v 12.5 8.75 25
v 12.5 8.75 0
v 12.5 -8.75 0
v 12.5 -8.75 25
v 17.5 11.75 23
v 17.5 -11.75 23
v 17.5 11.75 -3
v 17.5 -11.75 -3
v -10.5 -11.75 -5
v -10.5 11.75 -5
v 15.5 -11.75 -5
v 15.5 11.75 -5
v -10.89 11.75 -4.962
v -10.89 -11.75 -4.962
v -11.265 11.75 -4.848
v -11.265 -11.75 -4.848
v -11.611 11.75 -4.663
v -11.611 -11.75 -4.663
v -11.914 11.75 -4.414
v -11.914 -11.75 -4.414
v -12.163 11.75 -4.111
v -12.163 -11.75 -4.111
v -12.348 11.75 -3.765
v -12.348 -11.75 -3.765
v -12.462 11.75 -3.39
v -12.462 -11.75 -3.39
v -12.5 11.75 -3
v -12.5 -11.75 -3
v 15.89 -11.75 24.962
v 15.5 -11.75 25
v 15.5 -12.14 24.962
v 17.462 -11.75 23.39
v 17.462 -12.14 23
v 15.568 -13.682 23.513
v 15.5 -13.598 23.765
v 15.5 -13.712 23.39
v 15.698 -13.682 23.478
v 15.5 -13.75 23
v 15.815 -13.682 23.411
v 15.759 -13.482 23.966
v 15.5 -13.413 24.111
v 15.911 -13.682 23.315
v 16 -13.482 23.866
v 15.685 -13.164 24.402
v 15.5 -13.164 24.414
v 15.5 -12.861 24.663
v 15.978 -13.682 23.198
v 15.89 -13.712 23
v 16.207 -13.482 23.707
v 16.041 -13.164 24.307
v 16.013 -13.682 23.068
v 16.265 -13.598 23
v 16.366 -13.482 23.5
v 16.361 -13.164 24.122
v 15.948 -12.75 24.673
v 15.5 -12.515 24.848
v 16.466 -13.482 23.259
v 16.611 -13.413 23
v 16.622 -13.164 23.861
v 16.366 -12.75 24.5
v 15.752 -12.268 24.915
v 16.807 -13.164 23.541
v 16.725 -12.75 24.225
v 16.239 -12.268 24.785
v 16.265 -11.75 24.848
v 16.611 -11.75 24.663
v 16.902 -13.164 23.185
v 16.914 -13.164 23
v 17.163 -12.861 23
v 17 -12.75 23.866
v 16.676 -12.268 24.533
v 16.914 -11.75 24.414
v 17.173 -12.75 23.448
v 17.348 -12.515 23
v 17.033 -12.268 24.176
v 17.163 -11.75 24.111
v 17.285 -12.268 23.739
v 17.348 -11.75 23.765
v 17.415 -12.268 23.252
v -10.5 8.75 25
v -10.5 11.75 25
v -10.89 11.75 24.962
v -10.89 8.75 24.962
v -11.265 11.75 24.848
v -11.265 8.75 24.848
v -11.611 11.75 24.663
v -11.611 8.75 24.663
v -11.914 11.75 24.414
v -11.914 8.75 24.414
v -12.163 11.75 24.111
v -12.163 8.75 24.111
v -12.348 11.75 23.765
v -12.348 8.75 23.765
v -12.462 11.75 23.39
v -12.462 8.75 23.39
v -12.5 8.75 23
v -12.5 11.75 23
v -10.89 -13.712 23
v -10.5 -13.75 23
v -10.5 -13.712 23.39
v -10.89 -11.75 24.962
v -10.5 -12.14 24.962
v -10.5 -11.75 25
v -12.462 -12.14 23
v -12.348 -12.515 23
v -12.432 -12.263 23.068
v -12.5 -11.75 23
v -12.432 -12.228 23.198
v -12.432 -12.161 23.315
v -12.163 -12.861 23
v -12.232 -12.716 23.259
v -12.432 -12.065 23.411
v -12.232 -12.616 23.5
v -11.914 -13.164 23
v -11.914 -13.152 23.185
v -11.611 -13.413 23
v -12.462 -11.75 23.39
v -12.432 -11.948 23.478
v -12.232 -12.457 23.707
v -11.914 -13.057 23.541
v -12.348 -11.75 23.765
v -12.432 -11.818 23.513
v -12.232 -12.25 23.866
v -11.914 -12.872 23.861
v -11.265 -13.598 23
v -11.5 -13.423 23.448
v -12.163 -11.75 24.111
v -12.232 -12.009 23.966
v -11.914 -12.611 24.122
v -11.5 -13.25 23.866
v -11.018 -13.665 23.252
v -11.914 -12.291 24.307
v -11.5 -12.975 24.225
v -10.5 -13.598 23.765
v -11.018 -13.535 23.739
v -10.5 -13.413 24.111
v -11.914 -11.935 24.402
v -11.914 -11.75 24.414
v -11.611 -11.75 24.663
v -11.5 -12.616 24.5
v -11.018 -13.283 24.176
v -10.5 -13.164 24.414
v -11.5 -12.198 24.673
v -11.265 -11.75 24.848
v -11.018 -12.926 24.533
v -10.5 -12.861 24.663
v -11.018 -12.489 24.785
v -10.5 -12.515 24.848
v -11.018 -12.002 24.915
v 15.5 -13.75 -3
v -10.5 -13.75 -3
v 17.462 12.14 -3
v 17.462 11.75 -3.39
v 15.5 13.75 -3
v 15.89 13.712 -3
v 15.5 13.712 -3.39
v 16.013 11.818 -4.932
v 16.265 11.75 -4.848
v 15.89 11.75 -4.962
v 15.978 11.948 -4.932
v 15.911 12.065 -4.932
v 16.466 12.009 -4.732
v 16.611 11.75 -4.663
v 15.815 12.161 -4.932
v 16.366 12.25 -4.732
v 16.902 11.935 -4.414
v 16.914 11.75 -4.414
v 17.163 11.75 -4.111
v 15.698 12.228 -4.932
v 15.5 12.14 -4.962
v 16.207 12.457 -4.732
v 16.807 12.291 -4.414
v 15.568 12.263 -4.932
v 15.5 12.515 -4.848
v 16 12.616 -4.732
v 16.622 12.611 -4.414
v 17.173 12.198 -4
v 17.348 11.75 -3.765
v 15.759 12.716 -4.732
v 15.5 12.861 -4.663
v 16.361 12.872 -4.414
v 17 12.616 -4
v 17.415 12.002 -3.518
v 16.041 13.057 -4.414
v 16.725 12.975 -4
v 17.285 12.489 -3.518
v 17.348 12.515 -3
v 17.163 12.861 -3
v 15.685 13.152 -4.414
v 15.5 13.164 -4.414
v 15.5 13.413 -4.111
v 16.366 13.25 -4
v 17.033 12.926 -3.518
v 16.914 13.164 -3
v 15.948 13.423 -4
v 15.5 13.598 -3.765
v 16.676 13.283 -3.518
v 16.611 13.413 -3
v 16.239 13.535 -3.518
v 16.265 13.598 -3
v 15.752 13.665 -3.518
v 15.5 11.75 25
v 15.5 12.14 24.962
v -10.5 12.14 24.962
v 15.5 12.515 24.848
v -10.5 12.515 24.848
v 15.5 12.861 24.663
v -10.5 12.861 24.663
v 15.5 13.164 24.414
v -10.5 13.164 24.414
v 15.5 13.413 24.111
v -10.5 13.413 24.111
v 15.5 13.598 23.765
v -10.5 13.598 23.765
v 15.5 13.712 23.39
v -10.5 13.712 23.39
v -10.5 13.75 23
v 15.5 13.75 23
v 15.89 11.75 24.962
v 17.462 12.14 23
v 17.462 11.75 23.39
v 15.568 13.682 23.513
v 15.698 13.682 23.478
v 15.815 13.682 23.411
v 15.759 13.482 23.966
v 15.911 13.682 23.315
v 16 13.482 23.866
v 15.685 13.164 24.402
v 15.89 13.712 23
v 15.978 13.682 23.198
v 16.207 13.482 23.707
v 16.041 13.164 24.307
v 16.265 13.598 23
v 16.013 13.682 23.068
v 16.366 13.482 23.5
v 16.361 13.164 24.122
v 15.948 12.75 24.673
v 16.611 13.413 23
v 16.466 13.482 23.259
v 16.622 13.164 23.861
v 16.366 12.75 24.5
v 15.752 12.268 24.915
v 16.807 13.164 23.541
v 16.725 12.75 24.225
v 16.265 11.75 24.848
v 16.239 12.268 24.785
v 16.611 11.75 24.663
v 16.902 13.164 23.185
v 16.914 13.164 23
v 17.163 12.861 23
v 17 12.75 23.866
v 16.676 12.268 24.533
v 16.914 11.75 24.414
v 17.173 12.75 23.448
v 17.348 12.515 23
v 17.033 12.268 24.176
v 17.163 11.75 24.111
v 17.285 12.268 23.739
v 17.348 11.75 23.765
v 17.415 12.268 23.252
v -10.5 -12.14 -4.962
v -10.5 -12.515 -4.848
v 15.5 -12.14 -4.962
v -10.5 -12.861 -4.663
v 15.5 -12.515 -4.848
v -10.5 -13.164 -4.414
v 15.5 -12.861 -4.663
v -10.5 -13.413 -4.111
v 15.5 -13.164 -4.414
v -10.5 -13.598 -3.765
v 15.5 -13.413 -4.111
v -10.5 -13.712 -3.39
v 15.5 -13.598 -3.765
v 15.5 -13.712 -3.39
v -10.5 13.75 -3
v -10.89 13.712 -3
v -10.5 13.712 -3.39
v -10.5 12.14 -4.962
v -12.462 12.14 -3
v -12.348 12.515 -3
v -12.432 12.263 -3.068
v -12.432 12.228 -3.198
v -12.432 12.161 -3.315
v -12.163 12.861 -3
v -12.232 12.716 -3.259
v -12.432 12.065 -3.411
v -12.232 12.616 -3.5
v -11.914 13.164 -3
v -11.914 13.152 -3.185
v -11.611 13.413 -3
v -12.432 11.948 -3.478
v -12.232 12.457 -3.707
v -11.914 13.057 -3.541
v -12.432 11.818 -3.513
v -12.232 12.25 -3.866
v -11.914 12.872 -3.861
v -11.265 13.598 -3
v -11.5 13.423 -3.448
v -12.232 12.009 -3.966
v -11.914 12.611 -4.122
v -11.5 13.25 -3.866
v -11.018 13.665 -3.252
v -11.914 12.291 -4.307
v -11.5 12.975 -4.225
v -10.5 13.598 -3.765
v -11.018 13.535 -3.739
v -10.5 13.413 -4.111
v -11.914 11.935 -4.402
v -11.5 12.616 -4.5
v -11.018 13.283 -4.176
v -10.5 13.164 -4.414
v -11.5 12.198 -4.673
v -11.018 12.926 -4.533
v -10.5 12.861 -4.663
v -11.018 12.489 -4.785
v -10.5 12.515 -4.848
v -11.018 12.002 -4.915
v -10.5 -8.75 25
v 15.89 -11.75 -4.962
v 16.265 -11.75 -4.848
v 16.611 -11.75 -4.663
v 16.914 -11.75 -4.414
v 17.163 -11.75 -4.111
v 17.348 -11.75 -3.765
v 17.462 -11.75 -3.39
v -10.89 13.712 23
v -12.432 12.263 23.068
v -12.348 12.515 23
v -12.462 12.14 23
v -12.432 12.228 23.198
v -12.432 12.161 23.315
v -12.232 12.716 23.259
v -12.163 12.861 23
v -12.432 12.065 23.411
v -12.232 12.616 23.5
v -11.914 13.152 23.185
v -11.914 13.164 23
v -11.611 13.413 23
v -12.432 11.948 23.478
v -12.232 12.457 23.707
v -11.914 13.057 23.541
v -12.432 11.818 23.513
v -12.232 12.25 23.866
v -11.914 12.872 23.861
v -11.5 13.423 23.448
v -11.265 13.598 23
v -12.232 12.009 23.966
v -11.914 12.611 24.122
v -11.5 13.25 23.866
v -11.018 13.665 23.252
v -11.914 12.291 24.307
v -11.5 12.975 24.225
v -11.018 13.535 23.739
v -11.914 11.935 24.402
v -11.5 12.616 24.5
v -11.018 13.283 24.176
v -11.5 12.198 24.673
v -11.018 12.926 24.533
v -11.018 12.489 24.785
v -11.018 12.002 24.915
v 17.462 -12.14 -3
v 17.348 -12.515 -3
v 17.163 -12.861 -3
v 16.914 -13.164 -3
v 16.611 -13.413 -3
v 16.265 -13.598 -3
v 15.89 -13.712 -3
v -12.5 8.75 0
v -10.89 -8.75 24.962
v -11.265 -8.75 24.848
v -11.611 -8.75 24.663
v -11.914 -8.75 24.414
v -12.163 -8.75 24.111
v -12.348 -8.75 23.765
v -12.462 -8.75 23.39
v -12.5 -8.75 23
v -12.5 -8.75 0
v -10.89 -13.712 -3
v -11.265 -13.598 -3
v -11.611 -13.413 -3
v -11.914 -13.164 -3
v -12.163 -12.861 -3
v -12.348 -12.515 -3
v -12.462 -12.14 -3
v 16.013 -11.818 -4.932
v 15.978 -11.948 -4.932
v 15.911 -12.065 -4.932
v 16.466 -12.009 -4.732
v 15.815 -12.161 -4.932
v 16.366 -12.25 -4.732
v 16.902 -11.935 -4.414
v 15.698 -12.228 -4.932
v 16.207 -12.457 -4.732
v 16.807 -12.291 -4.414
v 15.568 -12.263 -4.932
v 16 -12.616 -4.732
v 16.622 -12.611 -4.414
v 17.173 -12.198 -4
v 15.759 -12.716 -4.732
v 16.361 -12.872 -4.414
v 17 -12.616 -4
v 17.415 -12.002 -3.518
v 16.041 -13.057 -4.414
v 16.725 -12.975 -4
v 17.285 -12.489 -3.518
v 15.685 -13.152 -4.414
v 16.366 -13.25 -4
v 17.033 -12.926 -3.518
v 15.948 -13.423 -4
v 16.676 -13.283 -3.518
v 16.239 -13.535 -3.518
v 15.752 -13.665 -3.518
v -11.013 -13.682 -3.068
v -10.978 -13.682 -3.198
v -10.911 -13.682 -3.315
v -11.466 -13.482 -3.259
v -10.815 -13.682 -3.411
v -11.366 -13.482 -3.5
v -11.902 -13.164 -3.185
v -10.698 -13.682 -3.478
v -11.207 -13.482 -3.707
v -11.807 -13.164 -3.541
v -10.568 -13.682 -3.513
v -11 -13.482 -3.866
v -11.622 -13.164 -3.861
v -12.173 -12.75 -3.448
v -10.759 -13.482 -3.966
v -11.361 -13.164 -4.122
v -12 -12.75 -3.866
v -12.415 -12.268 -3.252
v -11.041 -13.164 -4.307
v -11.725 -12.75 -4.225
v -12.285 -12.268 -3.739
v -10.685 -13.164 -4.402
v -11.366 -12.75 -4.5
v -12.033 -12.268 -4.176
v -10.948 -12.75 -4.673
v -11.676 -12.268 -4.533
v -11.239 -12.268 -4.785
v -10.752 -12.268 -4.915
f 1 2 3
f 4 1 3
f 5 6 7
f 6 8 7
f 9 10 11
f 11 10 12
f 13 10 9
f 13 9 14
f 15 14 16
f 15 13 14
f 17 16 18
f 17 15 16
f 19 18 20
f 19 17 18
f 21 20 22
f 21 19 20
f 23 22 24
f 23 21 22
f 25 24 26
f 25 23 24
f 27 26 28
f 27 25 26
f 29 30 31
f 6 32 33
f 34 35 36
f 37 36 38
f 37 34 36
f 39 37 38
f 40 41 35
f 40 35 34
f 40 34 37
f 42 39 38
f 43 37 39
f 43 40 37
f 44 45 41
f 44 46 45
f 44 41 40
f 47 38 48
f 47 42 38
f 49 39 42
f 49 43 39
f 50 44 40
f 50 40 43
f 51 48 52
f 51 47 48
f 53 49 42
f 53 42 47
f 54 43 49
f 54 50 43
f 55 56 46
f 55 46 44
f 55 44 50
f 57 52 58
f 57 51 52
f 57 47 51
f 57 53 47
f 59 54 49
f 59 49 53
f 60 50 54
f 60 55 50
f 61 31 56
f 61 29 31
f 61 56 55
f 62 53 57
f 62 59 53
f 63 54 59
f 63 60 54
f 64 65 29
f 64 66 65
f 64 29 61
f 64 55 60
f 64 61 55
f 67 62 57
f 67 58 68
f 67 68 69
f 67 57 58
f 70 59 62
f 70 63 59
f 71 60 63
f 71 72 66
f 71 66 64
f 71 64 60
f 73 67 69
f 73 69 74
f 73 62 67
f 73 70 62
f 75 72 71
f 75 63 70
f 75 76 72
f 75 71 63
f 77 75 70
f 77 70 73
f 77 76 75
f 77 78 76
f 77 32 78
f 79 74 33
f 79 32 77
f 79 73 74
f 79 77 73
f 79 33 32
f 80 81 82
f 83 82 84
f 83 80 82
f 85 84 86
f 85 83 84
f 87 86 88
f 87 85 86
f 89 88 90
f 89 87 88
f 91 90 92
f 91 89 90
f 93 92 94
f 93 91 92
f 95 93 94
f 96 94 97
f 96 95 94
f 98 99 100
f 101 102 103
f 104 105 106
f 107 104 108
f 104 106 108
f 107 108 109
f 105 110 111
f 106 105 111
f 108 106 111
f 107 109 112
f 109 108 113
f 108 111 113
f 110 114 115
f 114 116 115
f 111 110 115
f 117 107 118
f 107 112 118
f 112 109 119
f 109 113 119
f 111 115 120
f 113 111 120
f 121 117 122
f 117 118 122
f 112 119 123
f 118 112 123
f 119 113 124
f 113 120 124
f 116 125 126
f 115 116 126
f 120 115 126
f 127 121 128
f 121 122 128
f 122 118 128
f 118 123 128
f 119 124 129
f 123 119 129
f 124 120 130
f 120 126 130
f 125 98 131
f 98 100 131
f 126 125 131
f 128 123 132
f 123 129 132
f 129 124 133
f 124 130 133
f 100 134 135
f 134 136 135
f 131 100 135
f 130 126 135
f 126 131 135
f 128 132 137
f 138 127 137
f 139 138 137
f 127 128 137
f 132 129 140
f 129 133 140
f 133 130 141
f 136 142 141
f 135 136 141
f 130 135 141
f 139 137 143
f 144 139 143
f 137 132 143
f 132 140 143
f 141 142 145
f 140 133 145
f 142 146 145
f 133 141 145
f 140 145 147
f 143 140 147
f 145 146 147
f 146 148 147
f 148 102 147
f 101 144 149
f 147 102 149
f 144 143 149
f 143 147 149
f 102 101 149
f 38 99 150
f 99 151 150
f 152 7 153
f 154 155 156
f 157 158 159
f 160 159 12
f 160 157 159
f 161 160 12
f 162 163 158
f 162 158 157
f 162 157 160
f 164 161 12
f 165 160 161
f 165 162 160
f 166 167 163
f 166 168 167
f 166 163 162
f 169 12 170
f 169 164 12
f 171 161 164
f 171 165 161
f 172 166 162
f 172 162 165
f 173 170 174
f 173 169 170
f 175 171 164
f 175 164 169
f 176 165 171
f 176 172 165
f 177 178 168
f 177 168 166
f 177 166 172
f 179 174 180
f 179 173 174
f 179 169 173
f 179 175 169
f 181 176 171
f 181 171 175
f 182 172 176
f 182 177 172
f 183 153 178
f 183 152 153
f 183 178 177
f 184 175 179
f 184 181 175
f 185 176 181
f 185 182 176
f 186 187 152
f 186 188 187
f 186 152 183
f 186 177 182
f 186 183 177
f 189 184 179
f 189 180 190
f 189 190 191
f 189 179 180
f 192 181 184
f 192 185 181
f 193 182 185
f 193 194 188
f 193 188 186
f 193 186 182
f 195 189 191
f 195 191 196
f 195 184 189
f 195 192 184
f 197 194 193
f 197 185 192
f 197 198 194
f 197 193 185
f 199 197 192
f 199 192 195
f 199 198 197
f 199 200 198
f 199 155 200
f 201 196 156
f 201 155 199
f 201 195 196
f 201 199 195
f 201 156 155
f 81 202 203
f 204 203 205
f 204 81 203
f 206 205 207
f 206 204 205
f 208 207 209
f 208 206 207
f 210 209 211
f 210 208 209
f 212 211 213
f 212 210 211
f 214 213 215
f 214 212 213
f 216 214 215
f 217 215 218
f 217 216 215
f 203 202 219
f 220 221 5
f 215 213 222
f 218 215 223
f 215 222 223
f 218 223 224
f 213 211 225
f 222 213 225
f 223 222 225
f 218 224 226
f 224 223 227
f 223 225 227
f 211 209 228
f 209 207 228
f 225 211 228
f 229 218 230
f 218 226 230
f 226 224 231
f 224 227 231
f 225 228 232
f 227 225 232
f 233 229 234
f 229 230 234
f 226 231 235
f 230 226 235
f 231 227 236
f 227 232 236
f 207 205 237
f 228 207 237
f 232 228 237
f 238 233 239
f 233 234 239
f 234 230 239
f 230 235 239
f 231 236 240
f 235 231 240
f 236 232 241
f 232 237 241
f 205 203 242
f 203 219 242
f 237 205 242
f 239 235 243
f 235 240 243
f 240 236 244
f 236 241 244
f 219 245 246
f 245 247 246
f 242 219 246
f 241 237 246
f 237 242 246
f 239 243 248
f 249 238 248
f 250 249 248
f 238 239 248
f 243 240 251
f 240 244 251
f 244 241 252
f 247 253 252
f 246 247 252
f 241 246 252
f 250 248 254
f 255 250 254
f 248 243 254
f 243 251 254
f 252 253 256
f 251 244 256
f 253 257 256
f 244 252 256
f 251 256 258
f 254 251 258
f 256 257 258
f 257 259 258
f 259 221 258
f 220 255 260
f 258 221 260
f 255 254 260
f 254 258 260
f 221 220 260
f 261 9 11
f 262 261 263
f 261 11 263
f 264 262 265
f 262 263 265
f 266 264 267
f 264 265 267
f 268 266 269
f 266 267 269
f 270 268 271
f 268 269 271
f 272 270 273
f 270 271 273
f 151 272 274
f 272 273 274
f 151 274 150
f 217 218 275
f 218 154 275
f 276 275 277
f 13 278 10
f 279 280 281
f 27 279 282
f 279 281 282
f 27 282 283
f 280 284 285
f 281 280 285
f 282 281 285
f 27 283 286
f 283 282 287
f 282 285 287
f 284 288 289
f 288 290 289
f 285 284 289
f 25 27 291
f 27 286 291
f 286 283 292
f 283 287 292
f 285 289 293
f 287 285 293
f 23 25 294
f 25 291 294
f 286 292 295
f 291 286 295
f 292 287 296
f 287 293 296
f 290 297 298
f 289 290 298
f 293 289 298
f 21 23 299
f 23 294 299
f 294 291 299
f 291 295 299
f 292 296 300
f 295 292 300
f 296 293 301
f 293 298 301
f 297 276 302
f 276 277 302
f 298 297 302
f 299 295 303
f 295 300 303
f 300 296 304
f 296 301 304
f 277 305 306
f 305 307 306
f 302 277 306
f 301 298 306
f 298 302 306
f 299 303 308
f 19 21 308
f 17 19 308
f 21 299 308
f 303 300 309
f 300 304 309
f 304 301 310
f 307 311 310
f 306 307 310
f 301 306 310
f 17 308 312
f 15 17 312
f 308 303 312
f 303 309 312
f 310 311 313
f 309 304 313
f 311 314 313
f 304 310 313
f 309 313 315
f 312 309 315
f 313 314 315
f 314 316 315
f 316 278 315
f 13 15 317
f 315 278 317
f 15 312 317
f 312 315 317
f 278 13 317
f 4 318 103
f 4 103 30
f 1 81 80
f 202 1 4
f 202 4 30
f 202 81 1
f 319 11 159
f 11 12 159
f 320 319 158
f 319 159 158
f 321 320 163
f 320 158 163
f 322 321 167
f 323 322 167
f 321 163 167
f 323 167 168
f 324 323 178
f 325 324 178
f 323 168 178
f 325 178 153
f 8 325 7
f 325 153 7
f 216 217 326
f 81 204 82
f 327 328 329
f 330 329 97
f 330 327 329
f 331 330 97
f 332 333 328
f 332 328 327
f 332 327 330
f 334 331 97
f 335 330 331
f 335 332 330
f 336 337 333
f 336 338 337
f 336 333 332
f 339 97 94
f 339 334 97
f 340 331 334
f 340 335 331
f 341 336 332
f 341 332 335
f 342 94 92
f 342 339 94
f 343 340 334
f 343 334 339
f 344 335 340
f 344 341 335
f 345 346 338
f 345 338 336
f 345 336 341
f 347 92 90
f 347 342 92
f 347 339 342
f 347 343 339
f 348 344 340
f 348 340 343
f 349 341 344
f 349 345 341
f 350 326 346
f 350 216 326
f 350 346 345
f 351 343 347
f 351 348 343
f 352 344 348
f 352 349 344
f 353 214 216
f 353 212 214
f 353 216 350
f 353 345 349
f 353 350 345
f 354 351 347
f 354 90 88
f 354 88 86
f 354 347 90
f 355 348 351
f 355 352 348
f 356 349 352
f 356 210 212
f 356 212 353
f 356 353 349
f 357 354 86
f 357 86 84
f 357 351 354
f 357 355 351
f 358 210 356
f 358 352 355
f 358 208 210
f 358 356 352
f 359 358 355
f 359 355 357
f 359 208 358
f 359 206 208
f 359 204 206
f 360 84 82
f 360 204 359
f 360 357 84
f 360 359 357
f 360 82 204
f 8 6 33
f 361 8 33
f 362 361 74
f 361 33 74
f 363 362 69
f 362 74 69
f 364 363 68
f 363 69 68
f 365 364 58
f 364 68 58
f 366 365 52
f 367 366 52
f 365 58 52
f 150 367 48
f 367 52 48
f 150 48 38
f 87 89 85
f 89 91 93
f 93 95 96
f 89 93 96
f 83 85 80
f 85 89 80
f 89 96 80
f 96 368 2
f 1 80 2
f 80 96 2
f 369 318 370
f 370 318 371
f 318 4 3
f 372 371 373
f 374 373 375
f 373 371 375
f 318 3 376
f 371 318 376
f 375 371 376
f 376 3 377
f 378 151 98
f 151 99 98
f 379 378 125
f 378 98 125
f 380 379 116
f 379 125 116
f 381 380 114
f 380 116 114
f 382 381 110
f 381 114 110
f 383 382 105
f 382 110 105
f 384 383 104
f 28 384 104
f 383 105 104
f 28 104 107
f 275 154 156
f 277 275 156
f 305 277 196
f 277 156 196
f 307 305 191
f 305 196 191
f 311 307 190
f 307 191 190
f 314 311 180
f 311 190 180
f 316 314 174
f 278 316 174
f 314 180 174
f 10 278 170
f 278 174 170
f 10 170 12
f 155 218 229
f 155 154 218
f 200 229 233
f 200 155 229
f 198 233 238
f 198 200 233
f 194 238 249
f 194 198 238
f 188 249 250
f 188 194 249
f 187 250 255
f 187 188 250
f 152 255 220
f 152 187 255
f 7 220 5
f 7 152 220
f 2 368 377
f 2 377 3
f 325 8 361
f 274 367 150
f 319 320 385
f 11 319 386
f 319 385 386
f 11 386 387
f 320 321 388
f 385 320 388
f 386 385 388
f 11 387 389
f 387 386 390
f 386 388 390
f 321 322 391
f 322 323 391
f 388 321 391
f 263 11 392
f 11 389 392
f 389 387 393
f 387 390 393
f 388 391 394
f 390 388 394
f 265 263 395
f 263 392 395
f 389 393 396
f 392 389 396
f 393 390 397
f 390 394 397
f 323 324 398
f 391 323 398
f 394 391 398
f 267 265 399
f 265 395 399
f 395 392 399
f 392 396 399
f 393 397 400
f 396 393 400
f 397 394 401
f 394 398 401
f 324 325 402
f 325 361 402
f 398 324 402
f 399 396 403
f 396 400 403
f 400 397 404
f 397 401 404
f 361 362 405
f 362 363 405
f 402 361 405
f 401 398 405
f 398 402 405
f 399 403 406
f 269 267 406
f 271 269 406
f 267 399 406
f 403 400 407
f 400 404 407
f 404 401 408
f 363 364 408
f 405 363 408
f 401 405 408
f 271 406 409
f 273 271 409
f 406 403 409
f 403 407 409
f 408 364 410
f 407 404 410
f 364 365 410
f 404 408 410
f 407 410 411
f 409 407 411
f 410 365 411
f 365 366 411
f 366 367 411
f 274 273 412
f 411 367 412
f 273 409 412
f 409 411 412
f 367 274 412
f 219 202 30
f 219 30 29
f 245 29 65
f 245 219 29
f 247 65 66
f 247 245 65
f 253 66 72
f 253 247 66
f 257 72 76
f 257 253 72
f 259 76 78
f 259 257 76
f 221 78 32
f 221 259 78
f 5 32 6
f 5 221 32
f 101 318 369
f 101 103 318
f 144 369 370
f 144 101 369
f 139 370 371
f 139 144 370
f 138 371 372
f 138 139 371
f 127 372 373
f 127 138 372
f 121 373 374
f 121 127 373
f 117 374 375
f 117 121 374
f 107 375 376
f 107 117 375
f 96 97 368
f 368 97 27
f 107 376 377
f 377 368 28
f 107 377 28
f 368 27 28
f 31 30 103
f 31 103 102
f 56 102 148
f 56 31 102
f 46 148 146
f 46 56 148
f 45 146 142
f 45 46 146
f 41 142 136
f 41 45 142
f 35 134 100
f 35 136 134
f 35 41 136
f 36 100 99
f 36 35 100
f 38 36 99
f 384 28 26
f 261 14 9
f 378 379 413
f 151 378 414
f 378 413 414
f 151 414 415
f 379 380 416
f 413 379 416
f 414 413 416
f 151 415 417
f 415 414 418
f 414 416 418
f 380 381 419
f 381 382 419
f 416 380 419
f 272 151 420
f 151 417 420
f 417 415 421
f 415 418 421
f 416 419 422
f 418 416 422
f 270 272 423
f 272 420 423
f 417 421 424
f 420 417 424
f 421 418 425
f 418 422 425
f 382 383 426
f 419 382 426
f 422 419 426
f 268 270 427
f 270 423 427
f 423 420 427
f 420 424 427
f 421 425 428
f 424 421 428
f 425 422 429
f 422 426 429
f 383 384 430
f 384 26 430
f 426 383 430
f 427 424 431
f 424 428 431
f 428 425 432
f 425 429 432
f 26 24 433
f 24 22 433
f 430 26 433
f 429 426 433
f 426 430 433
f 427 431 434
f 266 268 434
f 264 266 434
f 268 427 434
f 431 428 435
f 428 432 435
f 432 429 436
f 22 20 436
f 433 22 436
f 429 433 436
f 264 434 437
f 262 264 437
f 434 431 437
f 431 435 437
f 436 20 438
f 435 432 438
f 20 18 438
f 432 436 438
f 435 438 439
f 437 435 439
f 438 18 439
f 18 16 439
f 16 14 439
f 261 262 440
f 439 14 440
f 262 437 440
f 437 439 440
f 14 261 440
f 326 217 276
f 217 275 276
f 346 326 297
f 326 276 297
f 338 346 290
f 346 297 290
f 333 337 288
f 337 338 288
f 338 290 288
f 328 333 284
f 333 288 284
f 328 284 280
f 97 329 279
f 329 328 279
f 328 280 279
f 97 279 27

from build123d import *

# Parameters (mm, degrees)
SKETCH_W     = 30
SKETCH_H     = 27.5
PAD_DEPTH    = 5
PAD001_DEPTH = 25
FILLET_R     = 2


with BuildPart() as part:
    # Sketch → Pad (new body)
    with BuildSketch(Plane.XY):
        with Locations((2.5, 0)):
            Rectangle(SKETCH_W, SKETCH_H)
    extrude(amount=-PAD_DEPTH)

    # Sketch001 → Pad001 (join)
    with BuildSketch(Plane.XY):
        Polygon((-12.5, 8.75), (12.5, 8.75), (12.5, -8.75), (-12.5, -8.75), (-12.5, -13.75), (17.5, -13.75), (17.5, 13.75), (-12.5, 13.75), align=None)
    extrude(amount=PAD001_DEPTH)

    # Fillet
    fillet_edges = [part.edges().sort_by_distance(p)[0] for p in [
        (17.5, 0, 25),
        (2.5, -13.75, 25),
        (2.5, 13.75, 25),
        (17.5, 13.75, 10),
        (17.5, -13.75, 10),
        (17.5, 0, -5),
        (2.5, 13.75, -5),
        (-12.5, 13.75, 10),
        (-12.5, 0, -5),
        (-12.5, -13.75, 10),
        (2.5, -13.75, -5),
        (-12.5, -11.25, 25),
        (-12.5, 11.25, 25),
    ]]
    fillet(fillet_edges, radius=FILLET_R)


solid = part.part
